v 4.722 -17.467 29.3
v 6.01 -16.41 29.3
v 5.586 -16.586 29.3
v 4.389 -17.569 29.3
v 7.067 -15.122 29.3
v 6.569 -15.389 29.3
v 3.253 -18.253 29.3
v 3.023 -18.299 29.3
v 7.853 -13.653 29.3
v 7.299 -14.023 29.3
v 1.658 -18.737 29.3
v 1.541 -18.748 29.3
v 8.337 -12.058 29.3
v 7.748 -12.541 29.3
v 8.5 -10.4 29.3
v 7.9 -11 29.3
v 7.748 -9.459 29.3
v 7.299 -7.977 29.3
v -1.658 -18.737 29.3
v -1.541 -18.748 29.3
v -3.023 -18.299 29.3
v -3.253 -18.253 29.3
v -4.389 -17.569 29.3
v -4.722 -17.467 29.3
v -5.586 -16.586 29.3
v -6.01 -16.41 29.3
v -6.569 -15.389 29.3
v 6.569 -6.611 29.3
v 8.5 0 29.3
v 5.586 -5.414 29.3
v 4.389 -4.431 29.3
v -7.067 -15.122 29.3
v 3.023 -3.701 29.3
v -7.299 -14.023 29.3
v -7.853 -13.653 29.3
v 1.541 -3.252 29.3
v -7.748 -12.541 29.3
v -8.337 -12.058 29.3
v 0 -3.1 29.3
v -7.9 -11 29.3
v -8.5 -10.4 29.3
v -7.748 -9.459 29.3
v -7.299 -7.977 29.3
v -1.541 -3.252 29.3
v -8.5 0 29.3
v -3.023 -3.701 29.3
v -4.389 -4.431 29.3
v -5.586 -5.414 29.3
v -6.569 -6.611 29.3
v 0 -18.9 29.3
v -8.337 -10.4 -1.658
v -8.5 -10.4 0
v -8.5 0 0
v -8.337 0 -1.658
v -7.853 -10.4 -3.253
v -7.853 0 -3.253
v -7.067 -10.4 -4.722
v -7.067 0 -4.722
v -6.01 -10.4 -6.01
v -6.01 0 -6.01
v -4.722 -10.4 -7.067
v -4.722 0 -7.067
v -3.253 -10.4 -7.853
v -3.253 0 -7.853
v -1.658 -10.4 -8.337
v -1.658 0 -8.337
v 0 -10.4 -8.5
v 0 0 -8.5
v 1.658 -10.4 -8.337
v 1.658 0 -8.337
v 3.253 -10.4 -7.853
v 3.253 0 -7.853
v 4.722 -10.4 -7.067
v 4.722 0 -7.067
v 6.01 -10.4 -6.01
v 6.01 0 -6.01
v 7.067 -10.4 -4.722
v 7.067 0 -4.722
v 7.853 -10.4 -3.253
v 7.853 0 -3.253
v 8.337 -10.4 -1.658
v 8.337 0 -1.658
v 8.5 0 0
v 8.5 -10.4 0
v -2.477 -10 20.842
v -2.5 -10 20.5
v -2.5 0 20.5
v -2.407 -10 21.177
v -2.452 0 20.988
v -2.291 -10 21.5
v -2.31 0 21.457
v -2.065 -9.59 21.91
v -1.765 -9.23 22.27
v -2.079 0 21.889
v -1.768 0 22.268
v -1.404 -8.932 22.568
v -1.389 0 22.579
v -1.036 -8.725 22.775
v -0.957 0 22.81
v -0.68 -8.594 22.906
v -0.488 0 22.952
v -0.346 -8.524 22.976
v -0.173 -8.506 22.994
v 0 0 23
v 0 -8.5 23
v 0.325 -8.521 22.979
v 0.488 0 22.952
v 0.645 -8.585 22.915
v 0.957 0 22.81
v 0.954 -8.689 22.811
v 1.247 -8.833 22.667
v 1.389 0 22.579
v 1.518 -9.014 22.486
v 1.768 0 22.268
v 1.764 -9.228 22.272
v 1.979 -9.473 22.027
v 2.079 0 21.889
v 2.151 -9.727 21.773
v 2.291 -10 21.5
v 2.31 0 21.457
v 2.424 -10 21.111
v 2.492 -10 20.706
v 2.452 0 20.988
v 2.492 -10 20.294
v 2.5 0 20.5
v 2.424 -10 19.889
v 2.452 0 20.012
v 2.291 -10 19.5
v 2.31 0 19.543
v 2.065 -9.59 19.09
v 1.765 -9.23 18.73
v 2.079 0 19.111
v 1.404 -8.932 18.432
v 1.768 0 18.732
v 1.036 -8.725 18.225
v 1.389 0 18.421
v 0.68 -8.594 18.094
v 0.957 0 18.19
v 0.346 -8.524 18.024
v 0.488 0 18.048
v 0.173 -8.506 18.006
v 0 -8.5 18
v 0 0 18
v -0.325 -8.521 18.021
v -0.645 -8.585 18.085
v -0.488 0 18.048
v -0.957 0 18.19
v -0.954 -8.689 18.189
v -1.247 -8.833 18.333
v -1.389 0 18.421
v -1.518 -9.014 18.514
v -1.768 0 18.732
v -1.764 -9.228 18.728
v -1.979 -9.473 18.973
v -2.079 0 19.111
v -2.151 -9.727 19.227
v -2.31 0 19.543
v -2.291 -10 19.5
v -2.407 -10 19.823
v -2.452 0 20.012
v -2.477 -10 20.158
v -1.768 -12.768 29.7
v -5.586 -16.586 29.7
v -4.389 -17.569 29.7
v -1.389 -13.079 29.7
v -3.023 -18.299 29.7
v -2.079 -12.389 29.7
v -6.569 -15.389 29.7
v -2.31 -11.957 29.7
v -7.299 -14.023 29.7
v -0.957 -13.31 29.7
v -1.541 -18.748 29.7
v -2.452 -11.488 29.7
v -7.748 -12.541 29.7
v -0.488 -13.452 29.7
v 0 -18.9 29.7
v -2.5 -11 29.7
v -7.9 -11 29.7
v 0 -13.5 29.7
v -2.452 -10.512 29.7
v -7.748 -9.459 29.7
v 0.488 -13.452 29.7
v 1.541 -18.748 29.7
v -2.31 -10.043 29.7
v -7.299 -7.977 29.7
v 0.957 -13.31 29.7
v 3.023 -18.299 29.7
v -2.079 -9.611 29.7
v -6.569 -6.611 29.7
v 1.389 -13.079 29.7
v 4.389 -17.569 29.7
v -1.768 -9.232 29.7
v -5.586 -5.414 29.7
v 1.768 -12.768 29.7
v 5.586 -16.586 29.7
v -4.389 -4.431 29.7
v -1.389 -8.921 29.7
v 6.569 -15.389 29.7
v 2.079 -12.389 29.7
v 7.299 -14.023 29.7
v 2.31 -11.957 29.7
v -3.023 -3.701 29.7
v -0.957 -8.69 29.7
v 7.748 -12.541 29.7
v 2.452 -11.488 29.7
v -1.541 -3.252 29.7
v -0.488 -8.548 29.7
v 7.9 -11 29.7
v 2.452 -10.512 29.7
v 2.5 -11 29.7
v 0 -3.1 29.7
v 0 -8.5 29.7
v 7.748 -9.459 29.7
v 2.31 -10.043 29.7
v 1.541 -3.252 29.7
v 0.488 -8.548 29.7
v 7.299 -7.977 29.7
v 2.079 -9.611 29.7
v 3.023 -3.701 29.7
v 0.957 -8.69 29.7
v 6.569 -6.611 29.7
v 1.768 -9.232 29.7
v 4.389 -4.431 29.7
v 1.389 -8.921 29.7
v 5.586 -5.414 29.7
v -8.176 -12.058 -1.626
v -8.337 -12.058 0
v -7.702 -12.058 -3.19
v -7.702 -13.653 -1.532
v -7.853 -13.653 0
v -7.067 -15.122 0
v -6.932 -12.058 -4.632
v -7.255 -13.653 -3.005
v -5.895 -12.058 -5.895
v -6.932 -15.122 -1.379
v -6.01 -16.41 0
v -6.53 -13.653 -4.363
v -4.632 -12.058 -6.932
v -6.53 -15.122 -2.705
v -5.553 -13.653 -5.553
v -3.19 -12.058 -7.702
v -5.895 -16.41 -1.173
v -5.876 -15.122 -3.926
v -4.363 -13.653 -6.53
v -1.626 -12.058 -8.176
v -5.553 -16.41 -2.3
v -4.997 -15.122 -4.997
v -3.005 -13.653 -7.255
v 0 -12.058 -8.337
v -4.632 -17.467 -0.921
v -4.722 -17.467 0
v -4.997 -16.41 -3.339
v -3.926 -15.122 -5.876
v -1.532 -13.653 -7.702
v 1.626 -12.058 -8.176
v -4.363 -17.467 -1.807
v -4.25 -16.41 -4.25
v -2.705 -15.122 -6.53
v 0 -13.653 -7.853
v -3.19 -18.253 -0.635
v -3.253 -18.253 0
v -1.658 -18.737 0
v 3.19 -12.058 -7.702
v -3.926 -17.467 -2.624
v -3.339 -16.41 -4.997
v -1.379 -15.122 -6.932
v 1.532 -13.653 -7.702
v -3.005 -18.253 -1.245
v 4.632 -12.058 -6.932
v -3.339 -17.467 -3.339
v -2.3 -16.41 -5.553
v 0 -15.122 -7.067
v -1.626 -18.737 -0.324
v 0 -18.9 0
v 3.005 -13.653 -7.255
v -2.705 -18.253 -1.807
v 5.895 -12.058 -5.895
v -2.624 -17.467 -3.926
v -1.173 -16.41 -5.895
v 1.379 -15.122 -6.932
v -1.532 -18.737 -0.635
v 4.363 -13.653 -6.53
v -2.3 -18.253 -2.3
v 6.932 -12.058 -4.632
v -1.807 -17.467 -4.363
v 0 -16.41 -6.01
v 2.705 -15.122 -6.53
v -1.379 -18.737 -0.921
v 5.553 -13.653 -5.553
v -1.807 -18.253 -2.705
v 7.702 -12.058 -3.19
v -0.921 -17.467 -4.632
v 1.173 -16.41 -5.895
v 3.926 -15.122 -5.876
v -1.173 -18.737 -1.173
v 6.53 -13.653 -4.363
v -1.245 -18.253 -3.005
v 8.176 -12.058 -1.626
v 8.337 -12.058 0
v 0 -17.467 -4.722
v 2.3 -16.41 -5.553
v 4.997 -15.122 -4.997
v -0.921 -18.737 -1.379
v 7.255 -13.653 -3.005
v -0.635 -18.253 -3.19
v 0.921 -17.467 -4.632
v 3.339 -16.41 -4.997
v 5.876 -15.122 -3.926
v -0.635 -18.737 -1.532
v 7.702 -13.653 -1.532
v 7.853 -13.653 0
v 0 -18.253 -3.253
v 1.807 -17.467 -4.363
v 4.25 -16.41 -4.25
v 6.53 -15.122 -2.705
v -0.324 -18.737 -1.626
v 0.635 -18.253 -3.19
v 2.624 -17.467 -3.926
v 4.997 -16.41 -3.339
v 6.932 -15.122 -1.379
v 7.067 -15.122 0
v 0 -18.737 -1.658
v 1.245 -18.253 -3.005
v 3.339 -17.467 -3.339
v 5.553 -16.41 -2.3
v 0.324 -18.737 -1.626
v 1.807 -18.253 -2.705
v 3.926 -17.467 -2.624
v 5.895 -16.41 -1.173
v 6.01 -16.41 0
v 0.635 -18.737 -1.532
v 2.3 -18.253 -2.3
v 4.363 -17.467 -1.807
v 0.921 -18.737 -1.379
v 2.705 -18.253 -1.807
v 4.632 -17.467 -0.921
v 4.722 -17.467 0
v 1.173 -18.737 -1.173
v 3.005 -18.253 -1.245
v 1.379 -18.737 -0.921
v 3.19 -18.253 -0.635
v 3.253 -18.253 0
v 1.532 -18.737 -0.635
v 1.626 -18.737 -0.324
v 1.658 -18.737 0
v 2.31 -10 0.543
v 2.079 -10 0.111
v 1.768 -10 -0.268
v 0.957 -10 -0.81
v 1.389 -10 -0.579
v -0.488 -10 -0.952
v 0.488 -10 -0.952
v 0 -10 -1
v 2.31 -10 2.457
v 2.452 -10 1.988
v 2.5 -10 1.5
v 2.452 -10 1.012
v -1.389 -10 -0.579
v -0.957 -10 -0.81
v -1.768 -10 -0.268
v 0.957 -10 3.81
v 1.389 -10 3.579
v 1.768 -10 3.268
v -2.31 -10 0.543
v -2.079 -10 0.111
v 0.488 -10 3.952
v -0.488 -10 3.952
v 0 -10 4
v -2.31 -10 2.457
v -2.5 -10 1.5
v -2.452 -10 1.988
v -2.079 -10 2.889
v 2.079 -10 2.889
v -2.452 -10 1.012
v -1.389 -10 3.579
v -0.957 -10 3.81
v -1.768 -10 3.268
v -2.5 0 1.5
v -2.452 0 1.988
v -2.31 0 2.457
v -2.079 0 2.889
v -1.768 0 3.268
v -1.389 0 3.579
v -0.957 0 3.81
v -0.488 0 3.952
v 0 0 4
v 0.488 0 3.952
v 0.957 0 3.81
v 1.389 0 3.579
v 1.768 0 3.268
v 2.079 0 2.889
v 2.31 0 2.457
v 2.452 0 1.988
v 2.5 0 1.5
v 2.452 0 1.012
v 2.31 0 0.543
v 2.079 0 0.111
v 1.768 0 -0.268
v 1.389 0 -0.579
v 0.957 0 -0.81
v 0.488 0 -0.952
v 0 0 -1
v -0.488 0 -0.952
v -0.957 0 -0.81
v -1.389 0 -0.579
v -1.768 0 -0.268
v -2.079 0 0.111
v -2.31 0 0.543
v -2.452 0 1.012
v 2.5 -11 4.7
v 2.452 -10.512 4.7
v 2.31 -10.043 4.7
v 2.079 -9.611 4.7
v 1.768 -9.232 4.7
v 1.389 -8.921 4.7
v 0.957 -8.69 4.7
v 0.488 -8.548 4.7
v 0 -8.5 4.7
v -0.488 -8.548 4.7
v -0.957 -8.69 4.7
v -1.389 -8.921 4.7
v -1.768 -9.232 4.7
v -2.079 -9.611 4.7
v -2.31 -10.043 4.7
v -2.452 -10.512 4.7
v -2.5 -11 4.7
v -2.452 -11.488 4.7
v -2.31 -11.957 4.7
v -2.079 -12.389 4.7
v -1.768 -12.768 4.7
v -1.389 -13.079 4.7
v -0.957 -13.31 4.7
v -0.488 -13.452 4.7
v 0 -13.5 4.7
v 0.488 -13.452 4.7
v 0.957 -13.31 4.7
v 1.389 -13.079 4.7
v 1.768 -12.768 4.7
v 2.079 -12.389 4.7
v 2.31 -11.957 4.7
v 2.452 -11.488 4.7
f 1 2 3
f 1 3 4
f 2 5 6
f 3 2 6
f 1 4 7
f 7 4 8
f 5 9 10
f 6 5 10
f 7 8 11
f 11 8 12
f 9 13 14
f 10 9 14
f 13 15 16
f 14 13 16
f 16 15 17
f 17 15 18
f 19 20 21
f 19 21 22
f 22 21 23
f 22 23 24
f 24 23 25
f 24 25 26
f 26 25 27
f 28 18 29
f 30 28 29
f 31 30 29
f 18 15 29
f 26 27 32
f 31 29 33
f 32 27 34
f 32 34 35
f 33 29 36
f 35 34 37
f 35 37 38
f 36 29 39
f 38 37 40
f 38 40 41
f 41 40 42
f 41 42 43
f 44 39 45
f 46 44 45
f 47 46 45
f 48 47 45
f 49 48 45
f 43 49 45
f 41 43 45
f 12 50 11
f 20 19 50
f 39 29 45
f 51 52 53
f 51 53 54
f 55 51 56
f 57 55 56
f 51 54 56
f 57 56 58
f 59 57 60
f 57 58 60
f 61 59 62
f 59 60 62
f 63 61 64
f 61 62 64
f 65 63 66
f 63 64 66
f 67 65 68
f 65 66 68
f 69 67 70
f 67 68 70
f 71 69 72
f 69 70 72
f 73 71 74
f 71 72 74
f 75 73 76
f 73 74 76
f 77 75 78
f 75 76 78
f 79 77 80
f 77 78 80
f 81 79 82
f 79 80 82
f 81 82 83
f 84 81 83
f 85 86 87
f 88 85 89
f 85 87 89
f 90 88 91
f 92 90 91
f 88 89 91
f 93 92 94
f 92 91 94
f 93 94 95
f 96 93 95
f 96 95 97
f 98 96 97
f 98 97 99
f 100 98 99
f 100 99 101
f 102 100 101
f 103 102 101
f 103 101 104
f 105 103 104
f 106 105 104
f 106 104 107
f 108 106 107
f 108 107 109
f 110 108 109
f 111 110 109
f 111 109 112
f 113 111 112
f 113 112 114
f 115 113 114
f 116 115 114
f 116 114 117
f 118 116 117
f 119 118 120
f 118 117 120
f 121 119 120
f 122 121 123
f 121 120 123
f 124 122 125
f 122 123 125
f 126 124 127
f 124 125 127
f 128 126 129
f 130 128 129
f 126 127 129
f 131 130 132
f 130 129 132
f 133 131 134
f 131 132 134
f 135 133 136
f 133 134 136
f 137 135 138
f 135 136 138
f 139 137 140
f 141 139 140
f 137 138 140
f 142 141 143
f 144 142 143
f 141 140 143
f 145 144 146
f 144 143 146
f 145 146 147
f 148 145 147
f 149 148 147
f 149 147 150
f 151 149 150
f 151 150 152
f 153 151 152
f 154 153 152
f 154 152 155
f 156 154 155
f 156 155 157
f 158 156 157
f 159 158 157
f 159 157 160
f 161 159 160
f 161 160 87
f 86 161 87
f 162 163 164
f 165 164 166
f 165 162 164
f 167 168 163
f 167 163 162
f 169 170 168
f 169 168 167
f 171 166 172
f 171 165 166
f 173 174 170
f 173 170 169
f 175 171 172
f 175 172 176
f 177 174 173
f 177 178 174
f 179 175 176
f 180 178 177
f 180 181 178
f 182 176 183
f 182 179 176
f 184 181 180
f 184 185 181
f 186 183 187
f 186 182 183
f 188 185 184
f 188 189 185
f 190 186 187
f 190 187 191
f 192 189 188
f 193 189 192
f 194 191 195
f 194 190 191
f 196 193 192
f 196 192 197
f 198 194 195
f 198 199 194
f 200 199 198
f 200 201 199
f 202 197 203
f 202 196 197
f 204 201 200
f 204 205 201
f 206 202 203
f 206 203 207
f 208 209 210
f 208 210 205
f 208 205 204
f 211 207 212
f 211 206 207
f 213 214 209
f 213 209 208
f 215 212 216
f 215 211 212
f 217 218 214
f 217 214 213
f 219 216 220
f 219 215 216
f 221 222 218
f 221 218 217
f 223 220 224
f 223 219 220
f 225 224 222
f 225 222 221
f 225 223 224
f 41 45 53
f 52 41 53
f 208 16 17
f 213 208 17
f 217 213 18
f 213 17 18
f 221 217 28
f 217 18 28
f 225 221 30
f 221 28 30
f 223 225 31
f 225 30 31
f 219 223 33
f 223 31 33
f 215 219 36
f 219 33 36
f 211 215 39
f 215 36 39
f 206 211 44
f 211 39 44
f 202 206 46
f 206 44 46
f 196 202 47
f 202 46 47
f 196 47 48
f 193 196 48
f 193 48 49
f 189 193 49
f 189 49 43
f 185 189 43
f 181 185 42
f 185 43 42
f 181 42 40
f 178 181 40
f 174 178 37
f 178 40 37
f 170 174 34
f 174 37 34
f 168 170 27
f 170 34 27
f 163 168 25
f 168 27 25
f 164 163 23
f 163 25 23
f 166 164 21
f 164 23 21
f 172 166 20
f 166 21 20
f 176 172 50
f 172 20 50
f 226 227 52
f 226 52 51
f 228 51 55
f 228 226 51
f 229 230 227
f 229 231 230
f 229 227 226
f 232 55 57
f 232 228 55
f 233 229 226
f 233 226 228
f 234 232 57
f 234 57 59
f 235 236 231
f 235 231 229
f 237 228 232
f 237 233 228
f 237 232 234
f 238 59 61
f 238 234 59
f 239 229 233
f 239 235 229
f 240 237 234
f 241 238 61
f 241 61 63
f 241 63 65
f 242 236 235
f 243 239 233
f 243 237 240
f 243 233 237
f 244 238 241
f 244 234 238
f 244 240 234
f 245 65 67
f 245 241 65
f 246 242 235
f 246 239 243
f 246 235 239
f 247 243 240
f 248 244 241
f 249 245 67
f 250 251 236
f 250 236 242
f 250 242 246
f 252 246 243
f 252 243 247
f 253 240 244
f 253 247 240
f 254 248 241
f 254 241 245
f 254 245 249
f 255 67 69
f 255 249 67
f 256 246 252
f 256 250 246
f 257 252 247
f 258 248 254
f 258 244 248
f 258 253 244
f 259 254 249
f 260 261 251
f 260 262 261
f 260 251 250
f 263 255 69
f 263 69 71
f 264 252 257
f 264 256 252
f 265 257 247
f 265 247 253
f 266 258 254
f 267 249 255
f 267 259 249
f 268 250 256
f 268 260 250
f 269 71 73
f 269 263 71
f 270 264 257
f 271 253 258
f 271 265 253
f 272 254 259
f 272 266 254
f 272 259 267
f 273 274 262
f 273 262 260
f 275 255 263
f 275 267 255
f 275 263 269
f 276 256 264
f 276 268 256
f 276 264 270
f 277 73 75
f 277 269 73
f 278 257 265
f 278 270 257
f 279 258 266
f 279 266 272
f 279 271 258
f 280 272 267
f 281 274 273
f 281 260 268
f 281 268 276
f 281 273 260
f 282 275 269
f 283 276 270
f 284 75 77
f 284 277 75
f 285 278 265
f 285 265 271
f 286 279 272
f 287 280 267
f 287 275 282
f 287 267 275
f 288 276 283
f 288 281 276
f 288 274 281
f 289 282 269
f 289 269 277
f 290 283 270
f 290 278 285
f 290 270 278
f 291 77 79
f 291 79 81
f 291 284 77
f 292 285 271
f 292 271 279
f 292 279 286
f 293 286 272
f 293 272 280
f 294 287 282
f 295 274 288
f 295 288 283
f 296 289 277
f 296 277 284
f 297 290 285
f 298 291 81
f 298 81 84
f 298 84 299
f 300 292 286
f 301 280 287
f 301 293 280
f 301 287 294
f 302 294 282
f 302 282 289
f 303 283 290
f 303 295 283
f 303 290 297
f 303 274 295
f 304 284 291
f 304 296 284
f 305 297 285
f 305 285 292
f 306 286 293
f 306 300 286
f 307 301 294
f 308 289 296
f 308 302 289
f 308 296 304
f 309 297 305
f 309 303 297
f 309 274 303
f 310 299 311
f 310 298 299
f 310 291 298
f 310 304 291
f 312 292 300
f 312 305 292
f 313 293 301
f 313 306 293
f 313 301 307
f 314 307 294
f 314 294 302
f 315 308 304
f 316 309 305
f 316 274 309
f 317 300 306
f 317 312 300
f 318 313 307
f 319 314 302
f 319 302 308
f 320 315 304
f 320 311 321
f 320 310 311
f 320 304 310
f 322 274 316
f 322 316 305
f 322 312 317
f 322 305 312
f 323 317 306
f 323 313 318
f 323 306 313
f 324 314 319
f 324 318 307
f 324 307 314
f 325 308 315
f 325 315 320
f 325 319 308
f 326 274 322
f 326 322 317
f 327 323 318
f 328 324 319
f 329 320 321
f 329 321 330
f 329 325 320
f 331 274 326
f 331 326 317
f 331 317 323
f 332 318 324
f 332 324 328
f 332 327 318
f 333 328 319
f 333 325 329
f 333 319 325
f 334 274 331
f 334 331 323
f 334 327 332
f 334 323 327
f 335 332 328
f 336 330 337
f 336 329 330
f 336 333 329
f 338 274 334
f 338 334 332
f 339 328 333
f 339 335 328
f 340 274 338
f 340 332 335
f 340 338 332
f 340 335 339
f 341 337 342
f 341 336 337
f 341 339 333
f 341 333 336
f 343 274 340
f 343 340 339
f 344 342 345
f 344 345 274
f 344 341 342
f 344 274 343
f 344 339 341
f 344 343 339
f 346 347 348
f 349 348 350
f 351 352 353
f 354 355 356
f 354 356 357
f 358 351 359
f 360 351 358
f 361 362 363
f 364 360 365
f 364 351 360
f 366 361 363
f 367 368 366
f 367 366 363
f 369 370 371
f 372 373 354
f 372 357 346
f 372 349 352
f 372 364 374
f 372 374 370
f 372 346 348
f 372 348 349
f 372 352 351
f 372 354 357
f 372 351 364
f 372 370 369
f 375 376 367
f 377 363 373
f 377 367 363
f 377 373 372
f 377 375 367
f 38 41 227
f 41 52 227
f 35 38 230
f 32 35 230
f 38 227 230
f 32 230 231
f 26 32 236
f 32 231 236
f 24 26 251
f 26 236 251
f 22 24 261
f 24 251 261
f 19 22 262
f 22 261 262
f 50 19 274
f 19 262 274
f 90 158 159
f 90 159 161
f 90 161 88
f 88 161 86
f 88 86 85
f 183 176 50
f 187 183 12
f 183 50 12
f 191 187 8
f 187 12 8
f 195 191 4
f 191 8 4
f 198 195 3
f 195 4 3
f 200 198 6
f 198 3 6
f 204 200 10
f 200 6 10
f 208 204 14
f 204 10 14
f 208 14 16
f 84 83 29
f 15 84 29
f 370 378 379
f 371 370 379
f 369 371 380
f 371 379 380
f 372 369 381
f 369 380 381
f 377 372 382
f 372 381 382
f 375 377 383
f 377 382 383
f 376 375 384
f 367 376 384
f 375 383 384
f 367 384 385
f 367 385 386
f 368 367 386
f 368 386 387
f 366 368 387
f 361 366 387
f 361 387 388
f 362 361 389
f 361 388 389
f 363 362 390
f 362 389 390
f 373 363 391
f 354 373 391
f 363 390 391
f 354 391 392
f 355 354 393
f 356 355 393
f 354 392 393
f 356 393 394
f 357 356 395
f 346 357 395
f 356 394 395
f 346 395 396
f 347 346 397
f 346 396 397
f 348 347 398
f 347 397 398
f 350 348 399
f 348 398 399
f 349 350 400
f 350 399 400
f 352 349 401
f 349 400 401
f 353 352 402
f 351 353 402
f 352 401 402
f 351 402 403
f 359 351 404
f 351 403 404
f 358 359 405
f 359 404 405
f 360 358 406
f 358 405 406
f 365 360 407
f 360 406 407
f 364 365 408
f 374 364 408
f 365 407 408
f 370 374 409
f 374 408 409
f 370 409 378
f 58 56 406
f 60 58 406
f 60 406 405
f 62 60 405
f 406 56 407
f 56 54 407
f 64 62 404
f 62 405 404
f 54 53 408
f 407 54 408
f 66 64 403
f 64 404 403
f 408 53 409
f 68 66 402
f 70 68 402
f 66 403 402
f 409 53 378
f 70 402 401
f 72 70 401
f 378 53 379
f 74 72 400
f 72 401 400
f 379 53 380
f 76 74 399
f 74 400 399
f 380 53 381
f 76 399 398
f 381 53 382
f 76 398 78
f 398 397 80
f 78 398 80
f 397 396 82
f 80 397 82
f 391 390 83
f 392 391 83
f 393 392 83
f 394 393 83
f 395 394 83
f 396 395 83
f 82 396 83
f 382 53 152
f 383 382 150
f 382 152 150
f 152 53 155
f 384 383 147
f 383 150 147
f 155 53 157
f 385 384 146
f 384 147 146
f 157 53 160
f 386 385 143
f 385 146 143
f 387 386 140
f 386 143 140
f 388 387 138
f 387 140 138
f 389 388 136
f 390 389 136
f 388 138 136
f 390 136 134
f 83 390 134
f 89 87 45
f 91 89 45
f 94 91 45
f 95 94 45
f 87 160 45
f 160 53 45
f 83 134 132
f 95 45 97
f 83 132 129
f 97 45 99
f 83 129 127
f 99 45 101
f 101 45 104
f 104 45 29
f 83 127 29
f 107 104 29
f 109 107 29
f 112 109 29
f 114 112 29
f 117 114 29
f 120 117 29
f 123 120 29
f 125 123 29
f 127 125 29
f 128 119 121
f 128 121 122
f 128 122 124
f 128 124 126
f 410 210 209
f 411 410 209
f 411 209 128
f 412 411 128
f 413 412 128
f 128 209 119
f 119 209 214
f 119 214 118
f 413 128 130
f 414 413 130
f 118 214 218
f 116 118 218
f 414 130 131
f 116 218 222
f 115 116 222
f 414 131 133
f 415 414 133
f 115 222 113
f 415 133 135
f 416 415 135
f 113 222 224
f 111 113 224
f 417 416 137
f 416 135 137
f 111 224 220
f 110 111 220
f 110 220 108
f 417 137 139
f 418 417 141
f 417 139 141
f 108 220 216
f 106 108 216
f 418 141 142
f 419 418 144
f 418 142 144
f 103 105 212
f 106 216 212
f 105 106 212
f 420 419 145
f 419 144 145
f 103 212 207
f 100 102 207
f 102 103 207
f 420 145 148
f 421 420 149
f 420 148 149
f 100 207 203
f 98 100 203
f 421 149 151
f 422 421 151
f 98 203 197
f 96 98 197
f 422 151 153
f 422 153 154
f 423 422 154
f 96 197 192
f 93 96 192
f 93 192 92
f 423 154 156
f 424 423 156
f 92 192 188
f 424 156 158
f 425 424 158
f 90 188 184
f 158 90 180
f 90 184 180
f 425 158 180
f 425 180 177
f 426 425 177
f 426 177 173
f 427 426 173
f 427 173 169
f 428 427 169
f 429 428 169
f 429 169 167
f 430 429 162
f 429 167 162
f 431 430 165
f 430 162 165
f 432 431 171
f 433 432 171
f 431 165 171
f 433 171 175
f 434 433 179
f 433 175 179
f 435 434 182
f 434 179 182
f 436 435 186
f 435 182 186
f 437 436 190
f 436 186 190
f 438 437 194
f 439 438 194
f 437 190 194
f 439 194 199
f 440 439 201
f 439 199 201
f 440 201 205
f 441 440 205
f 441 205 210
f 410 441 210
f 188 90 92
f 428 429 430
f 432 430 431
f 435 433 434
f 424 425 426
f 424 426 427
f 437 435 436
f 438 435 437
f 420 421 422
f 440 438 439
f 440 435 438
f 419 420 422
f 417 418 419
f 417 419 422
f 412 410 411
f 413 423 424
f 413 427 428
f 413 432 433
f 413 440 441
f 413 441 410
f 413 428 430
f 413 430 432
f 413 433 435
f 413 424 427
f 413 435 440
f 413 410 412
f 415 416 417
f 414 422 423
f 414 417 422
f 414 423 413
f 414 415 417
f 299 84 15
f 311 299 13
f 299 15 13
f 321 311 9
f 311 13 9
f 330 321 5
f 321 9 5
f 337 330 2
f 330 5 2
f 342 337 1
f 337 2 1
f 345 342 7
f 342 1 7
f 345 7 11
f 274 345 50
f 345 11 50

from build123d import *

# Parameters (mm, degrees)
F1_DEPTH = 18.9
F2_R     = 8.49999
F4_DEPTH = 0.4
F5_R     = 2.5
F6_DEPTH = 10
F7_R     = 2.5
F8_DEPTH = 25


# Not quite as in the source:
# - a fillet or chamfer is up to 0.001 mm smaller than in the source, because OpenCascade refuses the exact size


with BuildPart() as f1:
    # F0 (on Front) → F1 (new body)
    with BuildSketch(Plane.XZ):
        with BuildLine():
            ThreePointArc((-8.5, 0), (0, 8.5), (8.5, 0))
            Line((8.5, 0), (8.5, 29.3))
            Line((8.5, 29.3), (-8.5, 29.3))
            Line((-8.5, 29.3), (-8.5, 0))
        make_face()
        with BuildLine():
            Line((-8.5, 0), (8.5, 0))
            ThreePointArc((8.5, 0), (0, 8.5), (-8.5, 0))
        make_face()
        with BuildLine():
            ThreePointArc((-8.5, 0), (0, -8.5), (8.5, 0))
            Line((8.5, 0), (-8.5, 0))
        make_face()
    extrude(amount=F1_DEPTH)

    # F2 (radius 8.5 in the source; OpenCascade refuses exactly that, so slightly less here)
    f2_edges = [f1.edges().sort_by_distance(p)[0] for p in [
        (8.5, -18.9, 14.65),
    ]]
    fillet(f2_edges, radius=F2_R)

    # F3 (on face) → F4 (join)
    with BuildSketch(Plane.XY.offset(29.3)):
        with BuildLine():
            ThreePointArc((0, -18.9), (5.5861435714, -16.5861435714), (7.9, -11))
            ThreePointArc((7.9, -11), (-5.5861435714, -5.4138564286), (0, -18.9))
        make_face()
    extrude(amount=F4_DEPTH)

    # F5 (on face) → F6 (cut)
    with BuildSketch(Plane(origin=(0, 0, 0), x_dir=(-1, 0, 0), z_dir=(0, 1, 0))):
        with Locations((0, 20.5)):
            Circle(F5_R)
        with Locations((0, 1.5)):
            Circle(F5_R)
    extrude(amount=-F6_DEPTH, mode=Mode.SUBTRACT)

    # F7 (on face) → F8 (cut)
    with BuildSketch(Plane.XY.offset(29.7)):
        with Locations((0, -11)):
            Circle(F7_R)
    extrude(amount=-F8_DEPTH, mode=Mode.SUBTRACT)


solid = f1.part
